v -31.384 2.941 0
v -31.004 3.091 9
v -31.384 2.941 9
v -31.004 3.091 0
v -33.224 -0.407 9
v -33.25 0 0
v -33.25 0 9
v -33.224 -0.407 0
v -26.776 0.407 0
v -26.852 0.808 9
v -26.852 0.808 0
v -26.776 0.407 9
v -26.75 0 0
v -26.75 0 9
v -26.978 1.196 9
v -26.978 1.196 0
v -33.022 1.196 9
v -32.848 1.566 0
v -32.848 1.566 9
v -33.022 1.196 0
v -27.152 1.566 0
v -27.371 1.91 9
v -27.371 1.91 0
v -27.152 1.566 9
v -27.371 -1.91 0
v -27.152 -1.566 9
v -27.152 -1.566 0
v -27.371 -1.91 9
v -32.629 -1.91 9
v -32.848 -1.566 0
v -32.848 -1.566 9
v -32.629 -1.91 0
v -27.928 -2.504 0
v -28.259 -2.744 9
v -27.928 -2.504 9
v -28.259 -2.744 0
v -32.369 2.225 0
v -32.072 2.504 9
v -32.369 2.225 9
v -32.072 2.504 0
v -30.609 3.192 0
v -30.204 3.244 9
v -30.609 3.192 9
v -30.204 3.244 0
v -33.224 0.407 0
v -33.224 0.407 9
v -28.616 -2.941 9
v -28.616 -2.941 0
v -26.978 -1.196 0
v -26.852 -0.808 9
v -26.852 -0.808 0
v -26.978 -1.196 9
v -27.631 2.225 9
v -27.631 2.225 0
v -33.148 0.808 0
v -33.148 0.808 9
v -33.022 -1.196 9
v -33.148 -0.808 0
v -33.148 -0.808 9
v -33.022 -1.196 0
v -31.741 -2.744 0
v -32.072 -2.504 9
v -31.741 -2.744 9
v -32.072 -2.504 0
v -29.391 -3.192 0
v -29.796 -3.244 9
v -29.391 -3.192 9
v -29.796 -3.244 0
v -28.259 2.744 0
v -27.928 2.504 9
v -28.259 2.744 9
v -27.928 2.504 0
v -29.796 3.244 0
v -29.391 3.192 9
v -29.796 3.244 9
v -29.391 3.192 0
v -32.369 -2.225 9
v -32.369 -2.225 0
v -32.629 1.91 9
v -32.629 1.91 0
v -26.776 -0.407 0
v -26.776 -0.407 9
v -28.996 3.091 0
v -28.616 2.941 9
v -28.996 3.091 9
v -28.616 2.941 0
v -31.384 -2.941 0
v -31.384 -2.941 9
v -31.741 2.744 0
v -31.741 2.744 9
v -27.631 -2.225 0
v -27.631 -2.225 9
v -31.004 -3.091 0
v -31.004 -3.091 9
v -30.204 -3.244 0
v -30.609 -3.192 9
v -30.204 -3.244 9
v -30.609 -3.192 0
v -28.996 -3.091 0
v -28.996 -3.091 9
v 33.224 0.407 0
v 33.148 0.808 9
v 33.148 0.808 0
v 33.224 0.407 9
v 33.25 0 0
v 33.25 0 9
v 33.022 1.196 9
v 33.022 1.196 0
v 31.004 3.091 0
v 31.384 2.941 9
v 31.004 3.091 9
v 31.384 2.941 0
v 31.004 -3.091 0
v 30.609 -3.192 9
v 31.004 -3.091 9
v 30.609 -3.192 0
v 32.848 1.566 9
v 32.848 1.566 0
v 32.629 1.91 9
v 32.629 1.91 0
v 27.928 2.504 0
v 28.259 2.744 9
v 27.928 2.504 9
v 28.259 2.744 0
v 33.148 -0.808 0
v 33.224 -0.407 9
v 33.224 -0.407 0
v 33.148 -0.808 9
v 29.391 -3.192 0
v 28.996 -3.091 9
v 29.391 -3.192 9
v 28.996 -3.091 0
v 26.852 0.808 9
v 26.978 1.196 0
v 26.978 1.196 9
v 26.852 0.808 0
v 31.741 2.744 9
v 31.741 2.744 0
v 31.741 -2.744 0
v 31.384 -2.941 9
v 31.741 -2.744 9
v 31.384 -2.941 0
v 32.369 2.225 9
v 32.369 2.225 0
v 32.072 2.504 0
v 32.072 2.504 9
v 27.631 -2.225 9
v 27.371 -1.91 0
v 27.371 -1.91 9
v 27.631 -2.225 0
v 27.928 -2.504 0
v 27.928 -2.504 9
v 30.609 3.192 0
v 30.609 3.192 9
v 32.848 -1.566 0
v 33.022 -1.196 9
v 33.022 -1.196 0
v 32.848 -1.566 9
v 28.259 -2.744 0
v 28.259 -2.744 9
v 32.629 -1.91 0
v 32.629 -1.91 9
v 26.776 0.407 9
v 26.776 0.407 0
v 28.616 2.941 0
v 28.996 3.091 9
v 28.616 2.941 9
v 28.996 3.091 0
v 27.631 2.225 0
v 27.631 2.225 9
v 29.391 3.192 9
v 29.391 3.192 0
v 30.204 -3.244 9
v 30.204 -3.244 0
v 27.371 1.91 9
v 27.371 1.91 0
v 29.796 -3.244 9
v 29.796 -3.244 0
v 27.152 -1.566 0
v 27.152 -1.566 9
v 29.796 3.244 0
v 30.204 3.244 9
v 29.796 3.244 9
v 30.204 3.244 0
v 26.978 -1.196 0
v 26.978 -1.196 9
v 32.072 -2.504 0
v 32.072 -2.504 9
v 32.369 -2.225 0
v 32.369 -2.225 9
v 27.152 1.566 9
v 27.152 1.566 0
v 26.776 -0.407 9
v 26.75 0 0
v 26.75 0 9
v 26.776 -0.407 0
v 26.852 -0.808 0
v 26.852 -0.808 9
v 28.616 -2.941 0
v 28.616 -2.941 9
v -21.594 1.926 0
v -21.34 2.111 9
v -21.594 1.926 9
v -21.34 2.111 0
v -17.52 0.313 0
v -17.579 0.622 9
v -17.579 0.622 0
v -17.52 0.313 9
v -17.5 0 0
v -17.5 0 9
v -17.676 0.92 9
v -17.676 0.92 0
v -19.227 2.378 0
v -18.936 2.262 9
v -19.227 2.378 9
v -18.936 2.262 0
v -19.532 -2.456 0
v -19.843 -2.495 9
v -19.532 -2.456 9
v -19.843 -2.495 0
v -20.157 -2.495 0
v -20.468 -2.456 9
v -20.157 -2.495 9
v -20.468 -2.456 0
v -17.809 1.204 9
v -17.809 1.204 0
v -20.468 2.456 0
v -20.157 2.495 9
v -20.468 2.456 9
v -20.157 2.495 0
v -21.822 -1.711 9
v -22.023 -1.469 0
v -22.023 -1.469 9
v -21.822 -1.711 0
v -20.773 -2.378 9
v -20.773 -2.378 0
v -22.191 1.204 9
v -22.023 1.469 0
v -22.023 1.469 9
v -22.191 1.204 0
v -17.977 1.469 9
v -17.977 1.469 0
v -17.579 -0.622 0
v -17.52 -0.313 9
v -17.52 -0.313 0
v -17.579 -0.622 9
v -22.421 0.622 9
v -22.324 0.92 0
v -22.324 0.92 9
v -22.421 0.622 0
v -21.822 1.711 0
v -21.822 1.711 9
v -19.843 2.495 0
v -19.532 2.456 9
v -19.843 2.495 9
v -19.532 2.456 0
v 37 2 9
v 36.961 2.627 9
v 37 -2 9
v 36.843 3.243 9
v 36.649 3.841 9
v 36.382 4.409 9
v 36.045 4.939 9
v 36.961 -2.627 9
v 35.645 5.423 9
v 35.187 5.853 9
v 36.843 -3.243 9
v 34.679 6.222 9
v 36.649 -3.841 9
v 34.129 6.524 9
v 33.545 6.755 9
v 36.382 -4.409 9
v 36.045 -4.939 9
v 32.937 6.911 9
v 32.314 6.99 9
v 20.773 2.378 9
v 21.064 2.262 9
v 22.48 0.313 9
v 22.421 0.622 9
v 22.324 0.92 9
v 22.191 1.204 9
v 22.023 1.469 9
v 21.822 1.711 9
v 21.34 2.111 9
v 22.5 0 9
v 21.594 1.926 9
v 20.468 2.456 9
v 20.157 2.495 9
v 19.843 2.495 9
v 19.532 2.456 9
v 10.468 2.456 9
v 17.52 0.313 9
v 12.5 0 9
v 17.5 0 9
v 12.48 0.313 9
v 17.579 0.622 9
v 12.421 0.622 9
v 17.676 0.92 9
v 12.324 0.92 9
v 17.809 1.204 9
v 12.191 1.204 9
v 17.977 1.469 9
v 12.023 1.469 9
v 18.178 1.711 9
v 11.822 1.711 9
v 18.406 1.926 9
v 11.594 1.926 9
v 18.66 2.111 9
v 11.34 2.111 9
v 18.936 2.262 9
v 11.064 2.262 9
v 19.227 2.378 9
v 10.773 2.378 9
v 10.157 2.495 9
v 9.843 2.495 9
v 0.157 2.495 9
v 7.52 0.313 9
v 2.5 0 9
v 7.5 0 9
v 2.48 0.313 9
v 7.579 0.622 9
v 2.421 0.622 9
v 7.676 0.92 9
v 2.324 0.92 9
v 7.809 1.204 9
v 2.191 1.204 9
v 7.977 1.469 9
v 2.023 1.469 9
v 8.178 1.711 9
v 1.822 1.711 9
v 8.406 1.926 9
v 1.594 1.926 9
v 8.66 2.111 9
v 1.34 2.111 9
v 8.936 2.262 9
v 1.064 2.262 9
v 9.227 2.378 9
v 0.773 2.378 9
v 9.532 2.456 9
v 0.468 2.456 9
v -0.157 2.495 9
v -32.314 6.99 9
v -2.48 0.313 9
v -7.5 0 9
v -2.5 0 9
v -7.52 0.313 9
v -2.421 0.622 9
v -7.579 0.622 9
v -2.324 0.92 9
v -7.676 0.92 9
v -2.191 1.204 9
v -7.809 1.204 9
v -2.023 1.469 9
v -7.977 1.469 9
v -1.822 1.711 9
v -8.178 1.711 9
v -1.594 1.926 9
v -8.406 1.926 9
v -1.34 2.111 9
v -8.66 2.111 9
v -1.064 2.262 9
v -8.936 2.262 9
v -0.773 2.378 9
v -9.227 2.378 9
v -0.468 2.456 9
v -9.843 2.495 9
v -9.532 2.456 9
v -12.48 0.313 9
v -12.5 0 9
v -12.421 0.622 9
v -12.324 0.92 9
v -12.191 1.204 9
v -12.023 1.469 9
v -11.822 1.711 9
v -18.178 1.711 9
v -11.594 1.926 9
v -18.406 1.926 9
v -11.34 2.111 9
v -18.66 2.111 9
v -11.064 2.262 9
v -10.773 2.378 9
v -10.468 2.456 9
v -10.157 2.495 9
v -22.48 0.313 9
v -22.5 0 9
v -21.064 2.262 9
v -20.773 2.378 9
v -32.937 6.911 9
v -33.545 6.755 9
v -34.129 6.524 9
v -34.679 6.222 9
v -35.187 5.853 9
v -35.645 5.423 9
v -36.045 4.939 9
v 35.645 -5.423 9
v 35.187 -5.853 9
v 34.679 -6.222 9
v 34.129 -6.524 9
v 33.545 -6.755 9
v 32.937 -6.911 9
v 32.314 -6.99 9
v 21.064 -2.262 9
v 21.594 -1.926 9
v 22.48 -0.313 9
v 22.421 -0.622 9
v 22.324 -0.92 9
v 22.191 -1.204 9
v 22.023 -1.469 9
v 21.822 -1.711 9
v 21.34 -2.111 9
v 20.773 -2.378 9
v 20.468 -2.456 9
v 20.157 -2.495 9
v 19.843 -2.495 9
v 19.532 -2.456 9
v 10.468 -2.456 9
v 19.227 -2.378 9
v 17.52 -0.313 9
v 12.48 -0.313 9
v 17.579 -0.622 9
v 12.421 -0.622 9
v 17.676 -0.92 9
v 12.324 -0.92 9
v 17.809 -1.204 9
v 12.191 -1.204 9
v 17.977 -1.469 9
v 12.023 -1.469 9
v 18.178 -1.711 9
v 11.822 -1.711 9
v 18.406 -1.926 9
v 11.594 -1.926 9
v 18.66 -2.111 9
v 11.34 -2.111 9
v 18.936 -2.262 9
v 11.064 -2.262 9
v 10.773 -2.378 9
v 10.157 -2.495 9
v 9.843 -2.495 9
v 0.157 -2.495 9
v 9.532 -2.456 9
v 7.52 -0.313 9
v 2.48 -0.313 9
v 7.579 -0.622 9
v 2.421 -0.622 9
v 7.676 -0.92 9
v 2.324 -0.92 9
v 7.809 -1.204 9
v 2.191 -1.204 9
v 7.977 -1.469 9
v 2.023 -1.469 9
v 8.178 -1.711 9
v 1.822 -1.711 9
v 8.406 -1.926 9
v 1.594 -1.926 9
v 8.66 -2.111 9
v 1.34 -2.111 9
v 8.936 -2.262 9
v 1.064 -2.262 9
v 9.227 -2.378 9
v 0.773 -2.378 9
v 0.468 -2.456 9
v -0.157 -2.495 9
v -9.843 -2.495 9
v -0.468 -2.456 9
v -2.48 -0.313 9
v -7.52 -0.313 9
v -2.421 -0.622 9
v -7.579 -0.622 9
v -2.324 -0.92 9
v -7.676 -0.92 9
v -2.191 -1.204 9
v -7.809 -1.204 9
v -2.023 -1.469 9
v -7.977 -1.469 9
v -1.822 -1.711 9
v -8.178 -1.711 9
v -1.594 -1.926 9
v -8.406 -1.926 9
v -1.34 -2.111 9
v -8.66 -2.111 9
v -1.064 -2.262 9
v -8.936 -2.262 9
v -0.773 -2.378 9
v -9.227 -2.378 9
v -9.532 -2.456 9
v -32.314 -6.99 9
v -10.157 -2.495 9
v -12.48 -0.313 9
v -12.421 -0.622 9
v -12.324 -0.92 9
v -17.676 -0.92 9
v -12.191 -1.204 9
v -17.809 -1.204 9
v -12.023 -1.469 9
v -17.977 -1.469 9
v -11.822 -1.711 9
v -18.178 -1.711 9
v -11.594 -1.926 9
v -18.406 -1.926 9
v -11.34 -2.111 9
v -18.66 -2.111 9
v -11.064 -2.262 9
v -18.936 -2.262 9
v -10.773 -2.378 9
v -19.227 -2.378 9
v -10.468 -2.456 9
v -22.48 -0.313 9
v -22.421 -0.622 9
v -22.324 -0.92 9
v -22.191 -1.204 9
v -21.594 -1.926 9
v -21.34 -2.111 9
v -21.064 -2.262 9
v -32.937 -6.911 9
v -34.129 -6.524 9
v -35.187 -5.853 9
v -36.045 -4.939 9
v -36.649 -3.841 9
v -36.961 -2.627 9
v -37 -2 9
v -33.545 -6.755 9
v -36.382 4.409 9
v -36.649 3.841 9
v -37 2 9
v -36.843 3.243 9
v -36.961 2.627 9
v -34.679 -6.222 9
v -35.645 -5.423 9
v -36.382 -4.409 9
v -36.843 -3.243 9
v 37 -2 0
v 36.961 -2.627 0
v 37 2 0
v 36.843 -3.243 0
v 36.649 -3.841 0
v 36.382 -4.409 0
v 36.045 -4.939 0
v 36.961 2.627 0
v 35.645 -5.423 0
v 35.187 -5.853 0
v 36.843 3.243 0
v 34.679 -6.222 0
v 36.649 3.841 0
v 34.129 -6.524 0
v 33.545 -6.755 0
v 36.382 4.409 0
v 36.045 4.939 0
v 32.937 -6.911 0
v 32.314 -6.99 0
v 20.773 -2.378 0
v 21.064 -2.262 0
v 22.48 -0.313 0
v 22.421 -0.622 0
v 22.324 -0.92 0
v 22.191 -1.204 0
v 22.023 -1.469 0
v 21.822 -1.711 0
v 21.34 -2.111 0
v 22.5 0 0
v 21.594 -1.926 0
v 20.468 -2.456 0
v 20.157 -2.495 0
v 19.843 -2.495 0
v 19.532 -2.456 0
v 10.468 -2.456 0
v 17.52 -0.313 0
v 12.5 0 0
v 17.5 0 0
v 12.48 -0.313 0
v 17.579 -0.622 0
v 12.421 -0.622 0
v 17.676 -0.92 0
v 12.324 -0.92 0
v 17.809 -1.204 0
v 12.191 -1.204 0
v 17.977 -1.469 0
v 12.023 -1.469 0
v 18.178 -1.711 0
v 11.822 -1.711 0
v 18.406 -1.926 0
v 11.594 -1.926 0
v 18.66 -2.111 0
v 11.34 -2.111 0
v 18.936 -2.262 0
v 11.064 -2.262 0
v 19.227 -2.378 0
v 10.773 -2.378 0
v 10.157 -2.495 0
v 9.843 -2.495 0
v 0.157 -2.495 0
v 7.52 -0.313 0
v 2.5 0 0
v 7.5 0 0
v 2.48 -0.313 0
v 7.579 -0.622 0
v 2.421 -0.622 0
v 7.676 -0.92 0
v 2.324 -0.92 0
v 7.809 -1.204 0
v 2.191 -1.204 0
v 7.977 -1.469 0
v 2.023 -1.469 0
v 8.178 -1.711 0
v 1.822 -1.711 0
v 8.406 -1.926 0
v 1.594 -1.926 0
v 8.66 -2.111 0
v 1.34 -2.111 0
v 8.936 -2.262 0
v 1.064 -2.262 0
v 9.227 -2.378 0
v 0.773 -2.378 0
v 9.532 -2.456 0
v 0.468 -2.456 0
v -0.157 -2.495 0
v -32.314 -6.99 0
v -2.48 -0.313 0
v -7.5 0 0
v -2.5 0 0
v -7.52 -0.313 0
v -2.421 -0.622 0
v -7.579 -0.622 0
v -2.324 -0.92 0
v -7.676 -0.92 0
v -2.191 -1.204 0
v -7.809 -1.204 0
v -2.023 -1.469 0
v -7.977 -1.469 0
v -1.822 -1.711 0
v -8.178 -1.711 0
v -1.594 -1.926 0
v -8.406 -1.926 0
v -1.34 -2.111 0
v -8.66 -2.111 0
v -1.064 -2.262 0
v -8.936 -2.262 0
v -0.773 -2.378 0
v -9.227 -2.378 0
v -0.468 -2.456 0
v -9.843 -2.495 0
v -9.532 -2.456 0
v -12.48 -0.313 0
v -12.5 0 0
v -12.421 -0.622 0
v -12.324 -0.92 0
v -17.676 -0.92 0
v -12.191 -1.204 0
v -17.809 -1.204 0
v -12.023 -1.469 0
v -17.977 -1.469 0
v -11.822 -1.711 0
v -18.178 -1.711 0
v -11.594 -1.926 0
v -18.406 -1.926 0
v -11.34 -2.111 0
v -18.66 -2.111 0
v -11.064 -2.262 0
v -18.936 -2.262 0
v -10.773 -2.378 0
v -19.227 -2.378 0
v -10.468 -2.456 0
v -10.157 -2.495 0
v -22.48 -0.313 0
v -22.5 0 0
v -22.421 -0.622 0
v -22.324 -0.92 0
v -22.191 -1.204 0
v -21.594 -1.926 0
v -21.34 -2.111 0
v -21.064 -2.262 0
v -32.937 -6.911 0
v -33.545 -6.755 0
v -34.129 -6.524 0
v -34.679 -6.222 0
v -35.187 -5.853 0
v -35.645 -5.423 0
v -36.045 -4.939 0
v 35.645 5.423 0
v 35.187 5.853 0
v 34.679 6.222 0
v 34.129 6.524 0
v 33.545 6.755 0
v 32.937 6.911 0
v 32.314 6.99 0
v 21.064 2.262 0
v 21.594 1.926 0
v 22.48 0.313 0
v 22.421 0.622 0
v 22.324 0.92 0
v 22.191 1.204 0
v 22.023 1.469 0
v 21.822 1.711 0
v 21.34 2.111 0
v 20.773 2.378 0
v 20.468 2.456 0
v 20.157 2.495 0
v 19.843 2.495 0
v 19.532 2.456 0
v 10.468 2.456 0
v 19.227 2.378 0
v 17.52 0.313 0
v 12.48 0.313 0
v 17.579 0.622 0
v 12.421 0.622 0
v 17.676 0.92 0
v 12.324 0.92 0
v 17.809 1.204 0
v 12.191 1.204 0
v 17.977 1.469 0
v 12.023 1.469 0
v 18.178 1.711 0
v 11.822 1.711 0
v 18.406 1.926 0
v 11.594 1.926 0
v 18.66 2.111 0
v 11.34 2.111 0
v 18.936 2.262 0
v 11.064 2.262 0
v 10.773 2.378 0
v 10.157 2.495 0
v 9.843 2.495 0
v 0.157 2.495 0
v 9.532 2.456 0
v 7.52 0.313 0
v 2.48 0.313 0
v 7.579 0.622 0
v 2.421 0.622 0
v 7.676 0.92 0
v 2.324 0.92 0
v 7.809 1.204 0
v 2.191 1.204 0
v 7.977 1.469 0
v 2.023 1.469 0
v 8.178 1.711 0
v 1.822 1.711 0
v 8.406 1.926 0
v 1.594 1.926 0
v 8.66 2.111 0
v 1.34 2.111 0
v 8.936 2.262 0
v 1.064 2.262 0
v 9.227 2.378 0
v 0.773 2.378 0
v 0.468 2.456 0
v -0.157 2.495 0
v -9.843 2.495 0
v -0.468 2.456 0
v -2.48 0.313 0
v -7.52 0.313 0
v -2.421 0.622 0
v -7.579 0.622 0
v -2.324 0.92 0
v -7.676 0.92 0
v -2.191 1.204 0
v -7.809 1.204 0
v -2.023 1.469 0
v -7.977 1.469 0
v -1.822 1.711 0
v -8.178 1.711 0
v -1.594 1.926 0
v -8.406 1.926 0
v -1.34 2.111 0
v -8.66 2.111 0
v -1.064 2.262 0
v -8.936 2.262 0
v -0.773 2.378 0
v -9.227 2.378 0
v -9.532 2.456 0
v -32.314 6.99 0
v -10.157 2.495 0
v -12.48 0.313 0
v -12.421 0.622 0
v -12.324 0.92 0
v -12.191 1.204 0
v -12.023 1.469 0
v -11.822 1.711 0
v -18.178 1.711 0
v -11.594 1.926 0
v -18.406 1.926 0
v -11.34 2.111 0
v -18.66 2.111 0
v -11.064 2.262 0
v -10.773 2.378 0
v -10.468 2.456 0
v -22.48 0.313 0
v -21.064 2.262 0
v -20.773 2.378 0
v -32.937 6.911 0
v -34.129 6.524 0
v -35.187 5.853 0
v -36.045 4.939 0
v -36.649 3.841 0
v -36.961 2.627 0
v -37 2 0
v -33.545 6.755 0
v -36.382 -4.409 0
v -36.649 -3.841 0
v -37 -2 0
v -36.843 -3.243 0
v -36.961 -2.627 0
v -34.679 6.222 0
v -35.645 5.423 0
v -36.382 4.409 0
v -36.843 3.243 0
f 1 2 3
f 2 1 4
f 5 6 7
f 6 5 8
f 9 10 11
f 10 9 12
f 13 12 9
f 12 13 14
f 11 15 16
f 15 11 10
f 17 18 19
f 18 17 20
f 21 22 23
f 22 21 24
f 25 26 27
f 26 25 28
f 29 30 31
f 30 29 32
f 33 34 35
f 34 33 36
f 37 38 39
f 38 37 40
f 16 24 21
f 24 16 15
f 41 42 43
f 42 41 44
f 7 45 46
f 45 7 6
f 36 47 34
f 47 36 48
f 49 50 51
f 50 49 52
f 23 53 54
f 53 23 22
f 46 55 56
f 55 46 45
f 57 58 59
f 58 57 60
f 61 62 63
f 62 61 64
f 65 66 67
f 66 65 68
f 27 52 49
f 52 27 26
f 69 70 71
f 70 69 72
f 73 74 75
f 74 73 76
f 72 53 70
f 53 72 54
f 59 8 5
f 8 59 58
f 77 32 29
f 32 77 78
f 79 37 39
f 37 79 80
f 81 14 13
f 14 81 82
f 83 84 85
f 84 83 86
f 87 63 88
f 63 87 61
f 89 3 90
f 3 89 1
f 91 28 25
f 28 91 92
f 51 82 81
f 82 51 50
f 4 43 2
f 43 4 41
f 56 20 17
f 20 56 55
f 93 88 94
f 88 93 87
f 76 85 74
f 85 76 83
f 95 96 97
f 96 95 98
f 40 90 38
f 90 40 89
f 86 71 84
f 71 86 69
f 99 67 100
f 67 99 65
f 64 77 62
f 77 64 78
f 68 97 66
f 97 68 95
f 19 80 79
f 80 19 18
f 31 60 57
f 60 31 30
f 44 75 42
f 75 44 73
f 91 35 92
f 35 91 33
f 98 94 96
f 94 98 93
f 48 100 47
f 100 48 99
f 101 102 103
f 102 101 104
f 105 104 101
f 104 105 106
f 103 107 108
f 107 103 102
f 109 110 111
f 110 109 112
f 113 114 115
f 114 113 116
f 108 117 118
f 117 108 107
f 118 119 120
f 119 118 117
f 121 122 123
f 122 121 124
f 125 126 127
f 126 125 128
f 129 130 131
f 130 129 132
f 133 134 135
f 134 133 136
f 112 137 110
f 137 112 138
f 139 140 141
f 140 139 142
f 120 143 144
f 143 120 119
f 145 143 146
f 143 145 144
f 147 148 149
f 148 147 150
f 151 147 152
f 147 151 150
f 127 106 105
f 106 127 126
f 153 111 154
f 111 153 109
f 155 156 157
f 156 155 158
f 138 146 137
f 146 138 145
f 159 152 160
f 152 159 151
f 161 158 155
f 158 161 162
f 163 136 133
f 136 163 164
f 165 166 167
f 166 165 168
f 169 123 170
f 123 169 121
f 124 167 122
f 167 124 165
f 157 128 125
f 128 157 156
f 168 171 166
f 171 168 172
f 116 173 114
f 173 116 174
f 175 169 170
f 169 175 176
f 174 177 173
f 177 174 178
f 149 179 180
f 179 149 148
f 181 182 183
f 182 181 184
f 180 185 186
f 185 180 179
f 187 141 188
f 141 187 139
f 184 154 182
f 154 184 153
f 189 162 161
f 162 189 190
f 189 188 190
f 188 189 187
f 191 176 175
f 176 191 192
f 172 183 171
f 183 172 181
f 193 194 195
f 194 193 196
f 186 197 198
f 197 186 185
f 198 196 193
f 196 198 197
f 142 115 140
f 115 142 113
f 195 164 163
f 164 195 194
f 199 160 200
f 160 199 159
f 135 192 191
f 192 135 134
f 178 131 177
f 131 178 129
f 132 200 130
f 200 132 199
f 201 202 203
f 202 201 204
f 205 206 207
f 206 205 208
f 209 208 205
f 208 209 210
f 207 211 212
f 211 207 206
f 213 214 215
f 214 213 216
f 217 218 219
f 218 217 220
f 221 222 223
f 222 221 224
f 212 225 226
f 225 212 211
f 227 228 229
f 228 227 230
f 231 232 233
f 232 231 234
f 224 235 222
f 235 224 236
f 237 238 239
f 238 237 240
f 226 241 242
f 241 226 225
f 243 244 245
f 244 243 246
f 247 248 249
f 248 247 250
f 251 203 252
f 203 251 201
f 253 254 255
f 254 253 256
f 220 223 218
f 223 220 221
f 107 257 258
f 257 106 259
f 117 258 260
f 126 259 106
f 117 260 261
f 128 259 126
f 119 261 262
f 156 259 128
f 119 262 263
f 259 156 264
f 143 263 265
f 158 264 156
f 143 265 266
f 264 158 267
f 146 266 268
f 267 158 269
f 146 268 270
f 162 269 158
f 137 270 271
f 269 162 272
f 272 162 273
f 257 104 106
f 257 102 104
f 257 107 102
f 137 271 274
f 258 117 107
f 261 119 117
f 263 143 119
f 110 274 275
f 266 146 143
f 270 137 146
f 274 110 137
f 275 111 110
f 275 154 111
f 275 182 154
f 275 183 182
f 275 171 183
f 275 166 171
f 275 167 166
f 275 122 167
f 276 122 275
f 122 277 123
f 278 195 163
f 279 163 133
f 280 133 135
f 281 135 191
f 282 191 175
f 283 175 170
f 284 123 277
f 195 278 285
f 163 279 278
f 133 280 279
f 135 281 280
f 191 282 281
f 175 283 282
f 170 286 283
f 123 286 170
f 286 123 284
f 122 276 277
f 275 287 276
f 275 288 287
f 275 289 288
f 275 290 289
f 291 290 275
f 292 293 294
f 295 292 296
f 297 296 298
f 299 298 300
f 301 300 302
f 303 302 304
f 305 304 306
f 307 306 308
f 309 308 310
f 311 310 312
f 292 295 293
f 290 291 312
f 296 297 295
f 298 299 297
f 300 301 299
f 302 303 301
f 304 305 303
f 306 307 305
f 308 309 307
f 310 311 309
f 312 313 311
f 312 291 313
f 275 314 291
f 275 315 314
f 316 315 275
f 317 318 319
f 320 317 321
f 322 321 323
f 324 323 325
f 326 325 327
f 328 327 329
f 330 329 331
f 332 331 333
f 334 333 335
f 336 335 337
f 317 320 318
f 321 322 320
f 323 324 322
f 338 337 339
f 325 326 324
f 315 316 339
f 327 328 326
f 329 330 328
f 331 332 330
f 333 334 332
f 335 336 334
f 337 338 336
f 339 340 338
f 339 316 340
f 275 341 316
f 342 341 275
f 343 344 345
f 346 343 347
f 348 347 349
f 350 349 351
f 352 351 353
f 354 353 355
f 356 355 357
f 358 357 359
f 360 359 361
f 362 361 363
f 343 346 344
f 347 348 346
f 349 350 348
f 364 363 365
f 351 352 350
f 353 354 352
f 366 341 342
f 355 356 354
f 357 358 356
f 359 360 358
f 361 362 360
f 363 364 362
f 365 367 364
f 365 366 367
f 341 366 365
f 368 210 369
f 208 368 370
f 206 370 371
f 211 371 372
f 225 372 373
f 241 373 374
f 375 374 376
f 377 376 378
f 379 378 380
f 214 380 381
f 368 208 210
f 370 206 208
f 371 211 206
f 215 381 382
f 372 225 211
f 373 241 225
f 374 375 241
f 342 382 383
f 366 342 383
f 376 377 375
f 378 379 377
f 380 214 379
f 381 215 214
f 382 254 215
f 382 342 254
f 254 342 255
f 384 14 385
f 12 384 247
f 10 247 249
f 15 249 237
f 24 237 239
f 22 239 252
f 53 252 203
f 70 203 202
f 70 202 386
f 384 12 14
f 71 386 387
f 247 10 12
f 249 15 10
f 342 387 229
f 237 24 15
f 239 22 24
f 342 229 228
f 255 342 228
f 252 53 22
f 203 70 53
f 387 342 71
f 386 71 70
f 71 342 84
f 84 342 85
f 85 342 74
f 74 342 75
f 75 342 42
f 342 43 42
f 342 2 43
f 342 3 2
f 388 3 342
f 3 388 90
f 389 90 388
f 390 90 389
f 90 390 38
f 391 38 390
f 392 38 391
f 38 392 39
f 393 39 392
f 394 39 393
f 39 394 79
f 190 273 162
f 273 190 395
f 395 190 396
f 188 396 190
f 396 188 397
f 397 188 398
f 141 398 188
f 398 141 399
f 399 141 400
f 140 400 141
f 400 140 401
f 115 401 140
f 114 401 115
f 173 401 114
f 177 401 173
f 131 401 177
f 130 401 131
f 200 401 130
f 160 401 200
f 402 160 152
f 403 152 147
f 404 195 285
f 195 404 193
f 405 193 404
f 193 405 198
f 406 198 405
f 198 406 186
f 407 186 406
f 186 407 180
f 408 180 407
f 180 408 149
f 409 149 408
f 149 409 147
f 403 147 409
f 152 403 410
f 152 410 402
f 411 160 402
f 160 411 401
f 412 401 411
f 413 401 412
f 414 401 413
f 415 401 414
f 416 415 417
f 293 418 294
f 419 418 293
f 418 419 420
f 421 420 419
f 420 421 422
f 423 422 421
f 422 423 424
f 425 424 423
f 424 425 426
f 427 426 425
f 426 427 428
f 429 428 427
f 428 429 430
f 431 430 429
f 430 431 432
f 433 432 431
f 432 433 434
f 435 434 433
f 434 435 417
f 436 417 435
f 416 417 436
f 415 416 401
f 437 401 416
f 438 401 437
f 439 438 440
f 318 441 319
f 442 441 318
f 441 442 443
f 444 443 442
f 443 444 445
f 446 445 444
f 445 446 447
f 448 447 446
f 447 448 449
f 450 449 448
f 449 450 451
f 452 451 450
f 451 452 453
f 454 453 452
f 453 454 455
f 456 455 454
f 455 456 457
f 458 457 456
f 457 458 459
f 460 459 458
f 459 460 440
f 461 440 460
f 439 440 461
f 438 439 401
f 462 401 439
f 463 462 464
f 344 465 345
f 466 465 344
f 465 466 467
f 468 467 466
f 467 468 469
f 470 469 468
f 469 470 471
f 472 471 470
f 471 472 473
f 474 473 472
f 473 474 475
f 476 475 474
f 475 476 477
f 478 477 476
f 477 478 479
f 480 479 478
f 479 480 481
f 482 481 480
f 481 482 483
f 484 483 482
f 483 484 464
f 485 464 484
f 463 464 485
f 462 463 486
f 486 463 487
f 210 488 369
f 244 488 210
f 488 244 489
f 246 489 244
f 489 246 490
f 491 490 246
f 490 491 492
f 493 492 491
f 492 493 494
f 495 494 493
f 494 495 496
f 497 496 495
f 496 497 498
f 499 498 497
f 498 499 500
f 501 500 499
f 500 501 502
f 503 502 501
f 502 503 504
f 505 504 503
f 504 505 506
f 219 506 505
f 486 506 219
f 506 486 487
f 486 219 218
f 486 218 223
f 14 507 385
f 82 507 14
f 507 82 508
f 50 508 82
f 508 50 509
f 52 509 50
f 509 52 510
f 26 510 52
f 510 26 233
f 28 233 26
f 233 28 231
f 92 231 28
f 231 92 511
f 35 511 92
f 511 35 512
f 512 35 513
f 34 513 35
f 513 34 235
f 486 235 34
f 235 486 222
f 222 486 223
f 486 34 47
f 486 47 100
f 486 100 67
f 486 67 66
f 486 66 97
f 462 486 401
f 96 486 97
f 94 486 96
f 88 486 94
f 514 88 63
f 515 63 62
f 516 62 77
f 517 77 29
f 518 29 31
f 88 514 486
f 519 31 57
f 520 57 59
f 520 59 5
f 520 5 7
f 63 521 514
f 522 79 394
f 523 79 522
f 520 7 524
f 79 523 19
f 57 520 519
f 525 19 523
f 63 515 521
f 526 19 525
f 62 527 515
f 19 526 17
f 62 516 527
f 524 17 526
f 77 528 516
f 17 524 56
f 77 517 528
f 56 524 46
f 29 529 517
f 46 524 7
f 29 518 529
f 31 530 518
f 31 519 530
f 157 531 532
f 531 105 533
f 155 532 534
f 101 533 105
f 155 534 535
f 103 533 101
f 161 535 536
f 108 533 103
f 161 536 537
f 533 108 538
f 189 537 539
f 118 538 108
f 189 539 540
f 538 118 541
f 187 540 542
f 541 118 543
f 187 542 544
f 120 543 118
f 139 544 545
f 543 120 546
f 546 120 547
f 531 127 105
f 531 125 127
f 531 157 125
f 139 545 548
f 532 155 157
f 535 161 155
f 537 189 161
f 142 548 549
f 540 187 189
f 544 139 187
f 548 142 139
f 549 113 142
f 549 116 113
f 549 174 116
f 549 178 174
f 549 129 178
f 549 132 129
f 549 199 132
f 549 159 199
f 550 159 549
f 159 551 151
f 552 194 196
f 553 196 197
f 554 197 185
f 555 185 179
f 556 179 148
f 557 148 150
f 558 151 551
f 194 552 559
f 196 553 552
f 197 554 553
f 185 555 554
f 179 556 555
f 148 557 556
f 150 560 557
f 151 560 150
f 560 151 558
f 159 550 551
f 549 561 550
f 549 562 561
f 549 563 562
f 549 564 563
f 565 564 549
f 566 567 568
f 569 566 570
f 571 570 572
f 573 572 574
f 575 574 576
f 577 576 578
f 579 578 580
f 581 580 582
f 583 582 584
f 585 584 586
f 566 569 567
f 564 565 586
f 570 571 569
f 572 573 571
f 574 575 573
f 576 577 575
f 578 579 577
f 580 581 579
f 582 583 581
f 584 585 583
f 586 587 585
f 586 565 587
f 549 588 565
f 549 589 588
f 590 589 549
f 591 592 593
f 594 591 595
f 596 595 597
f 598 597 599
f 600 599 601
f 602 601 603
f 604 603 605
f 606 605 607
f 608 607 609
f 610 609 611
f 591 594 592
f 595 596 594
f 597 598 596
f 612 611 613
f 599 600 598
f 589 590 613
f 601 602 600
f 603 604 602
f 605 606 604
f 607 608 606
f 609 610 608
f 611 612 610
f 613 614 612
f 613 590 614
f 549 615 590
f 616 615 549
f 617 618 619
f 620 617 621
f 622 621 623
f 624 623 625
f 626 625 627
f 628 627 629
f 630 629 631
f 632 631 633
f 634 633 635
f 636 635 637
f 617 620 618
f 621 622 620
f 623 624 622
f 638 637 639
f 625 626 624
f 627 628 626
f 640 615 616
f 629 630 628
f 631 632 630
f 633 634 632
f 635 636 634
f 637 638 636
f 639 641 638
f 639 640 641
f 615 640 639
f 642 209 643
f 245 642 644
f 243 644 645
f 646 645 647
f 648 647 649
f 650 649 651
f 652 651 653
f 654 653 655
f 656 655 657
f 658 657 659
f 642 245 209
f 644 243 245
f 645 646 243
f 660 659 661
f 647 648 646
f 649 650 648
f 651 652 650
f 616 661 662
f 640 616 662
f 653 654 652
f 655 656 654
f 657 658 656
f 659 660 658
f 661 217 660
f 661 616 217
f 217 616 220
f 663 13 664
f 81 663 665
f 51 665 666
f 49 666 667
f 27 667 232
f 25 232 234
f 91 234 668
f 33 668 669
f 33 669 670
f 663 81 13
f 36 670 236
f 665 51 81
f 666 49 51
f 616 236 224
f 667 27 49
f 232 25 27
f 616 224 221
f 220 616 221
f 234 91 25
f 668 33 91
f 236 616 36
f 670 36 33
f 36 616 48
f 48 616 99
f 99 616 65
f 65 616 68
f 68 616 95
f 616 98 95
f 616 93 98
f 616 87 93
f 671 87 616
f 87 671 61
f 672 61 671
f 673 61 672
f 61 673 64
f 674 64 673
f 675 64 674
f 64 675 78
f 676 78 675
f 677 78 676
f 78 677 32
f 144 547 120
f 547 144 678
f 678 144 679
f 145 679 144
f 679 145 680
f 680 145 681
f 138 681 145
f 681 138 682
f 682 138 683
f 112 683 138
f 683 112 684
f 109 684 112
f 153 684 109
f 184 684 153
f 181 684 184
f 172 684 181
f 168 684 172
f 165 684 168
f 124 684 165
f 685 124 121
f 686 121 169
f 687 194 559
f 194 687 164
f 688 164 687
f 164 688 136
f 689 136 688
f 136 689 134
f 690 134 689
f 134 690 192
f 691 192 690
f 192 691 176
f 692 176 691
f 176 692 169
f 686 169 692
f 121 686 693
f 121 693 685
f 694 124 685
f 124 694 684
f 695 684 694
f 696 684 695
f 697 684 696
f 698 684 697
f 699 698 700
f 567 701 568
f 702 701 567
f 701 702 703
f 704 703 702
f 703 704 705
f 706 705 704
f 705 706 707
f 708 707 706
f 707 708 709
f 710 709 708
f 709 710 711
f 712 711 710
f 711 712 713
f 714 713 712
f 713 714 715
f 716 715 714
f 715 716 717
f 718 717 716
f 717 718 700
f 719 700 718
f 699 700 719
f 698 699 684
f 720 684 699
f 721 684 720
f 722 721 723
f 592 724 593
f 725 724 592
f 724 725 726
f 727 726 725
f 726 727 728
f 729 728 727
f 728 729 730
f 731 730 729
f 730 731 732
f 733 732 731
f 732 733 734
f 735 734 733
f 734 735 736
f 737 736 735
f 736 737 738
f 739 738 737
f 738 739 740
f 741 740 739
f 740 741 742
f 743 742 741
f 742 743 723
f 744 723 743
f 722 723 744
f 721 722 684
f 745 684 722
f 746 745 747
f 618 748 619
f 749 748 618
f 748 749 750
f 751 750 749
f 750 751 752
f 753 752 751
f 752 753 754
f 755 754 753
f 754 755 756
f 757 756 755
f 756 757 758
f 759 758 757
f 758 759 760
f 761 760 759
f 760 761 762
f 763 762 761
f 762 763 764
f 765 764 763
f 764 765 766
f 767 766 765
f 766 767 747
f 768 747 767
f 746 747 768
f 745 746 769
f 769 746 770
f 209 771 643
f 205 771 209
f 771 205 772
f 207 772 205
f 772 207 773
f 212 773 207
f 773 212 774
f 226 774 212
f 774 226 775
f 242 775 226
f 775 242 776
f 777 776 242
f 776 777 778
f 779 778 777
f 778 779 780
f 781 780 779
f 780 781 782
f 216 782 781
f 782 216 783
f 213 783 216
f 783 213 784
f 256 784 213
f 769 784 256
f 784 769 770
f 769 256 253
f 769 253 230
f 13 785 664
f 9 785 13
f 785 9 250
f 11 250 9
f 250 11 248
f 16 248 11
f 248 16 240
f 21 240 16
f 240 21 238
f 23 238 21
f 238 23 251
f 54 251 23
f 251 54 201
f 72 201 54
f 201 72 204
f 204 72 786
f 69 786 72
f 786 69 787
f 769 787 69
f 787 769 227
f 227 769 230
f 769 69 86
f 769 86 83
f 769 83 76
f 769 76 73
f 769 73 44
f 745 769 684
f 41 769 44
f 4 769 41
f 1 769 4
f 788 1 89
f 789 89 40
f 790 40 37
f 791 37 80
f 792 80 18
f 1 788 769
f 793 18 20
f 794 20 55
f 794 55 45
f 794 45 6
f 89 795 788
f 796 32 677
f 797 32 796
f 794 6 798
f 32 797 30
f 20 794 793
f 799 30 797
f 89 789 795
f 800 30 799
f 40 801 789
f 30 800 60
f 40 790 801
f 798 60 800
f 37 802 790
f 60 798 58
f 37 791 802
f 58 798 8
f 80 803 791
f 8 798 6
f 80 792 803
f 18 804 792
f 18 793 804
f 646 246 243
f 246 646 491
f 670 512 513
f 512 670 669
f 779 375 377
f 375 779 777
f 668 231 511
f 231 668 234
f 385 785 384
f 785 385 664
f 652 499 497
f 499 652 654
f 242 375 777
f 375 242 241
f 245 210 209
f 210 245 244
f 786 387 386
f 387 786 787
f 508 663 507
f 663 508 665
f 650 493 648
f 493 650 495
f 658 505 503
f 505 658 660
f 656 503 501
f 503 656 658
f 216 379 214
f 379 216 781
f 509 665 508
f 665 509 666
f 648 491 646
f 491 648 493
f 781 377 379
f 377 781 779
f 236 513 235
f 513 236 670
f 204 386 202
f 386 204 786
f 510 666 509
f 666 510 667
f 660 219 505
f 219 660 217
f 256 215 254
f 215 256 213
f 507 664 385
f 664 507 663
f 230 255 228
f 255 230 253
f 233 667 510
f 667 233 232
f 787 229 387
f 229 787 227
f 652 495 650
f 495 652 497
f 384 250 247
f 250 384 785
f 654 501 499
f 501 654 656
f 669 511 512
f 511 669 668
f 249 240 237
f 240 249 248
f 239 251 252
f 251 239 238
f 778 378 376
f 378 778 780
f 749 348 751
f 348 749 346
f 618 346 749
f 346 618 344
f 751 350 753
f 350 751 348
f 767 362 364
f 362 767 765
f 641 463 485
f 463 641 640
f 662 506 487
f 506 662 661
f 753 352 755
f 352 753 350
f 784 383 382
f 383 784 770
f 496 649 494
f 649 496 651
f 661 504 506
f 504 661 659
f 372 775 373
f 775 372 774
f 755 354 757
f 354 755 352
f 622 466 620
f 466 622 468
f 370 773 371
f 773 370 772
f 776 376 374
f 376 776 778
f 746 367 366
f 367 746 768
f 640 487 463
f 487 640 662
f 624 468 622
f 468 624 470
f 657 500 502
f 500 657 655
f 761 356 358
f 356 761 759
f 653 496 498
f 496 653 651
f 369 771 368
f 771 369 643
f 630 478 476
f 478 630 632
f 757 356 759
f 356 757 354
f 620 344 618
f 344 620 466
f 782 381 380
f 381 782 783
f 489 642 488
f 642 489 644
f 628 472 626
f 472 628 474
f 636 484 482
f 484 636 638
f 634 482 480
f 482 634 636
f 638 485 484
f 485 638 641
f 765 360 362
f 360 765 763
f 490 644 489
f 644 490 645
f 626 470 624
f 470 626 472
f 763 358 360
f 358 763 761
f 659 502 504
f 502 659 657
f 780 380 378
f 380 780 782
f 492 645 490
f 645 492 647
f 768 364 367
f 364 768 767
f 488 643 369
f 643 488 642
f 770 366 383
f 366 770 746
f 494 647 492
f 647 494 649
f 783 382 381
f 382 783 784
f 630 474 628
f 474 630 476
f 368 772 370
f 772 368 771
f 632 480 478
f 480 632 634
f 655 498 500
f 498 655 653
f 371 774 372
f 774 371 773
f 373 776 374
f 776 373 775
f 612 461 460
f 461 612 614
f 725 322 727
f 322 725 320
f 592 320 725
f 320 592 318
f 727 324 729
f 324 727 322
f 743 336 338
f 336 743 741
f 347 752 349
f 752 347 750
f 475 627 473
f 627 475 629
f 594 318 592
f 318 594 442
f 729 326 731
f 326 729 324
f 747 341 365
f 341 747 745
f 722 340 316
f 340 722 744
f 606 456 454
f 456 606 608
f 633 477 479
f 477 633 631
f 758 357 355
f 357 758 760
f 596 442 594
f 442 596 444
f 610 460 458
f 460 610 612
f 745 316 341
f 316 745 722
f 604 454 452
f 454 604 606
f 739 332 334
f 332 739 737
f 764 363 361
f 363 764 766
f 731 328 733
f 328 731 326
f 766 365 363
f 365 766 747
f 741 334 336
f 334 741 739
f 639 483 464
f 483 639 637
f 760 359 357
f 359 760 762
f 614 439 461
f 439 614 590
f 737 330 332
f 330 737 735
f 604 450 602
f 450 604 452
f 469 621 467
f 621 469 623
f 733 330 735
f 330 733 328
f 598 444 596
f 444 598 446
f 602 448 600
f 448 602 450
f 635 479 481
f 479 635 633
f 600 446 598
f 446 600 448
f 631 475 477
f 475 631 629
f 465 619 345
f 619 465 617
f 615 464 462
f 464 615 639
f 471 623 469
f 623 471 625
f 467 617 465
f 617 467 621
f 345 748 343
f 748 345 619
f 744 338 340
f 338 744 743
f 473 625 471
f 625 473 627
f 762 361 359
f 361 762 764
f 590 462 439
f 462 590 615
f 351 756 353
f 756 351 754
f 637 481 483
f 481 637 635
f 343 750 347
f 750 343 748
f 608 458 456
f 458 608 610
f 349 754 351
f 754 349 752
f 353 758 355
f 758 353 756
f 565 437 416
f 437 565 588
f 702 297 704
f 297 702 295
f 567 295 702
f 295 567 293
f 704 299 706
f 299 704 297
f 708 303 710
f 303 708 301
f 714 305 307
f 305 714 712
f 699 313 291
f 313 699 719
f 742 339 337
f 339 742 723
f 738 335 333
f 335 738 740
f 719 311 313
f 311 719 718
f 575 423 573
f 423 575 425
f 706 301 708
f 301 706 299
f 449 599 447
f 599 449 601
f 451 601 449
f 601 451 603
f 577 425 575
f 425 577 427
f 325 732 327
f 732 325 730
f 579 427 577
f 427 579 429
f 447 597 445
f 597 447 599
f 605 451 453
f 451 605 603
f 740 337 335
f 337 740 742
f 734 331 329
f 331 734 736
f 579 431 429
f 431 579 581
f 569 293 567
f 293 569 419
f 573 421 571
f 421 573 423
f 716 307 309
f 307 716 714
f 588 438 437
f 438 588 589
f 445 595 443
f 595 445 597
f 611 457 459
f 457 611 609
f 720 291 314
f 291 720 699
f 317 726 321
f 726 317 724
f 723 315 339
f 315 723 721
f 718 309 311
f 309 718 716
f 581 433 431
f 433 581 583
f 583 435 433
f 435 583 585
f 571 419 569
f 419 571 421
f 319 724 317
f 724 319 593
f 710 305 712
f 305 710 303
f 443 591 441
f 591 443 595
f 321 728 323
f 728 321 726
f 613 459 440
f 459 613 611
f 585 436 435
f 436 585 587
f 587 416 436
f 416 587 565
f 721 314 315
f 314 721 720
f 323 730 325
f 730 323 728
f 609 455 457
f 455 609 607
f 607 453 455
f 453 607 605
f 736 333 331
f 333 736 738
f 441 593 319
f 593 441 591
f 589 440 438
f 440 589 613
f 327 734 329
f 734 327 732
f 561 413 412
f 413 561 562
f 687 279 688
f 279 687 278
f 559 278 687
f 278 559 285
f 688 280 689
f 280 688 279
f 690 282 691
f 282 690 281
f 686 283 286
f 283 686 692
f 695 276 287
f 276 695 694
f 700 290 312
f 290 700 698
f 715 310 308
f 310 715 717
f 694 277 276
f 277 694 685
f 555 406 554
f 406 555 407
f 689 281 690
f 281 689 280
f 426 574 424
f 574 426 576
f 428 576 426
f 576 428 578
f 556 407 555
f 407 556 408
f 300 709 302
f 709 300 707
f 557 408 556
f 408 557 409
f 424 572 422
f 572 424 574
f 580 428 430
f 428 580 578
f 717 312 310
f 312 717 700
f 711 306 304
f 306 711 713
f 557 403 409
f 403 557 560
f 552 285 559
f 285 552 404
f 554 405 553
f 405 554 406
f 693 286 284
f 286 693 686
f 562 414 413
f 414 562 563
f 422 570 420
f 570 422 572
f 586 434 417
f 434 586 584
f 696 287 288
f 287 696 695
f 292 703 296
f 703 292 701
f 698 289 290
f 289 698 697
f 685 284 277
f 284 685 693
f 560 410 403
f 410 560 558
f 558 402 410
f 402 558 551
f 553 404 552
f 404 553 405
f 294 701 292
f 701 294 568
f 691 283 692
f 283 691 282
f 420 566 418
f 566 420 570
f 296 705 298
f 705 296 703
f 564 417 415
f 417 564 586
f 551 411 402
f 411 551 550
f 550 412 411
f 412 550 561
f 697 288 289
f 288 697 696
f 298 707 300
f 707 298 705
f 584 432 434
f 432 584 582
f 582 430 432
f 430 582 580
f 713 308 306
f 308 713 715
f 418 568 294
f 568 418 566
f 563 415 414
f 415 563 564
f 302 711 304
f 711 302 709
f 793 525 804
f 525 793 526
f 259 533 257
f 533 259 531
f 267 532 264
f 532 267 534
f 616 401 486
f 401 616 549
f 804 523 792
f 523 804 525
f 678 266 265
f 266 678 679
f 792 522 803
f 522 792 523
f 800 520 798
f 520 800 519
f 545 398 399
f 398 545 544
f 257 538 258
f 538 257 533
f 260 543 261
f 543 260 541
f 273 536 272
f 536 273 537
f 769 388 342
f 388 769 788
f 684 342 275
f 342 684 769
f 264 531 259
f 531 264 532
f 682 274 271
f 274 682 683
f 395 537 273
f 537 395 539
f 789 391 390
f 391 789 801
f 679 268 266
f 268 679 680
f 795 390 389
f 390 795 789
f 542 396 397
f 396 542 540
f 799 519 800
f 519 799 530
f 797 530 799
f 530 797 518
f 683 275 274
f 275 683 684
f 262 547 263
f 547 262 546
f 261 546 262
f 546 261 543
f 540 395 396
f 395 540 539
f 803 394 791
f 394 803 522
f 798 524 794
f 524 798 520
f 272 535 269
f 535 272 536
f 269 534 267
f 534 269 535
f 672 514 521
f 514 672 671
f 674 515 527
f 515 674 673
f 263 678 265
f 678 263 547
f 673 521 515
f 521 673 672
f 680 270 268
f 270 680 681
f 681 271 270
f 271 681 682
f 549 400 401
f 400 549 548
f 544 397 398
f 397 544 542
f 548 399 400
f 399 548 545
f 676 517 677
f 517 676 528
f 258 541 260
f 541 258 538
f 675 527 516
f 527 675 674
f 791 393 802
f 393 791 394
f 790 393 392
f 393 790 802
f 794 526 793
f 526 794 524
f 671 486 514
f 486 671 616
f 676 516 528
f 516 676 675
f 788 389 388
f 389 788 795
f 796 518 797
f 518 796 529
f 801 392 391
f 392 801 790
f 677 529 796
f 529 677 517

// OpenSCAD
$fn = 50;


difference() {
	union() {
		hull() {
			translate(v = [-32.0000000000, 2.0000000000, 0]) {
				cylinder(h = 9, r = 5);
			}
			translate(v = [32.0000000000, 2.0000000000, 0]) {
				cylinder(h = 9, r = 5);
			}
			translate(v = [-32.0000000000, -2.0000000000, 0]) {
				cylinder(h = 9, r = 5);
			}
			translate(v = [32.0000000000, -2.0000000000, 0]) {
				cylinder(h = 9, r = 5);
			}
		}
	}
	union() {
		#translate(v = [-30.0000000000, 0.0000000000, 0]) {
			cylinder(h = 9, r = 3.2500000000);
		}
		#translate(v = [30.0000000000, 0.0000000000, 0]) {
			cylinder(h = 9, r = 3.2500000000);
		}
		#translate(v = [-30.0000000000, 0.0000000000, -100.0000000000]) {
			cylinder(h = 200, r = 3.2500000000);
		}
		#translate(v = [-30.0000000000, 0.0000000000, -100.0000000000]) {
			cylinder(h = 200, r = 3.2500000000);
		}
		#translate(v = [30.0000000000, 0.0000000000, -100.0000000000]) {
			cylinder(h = 200, r = 3.2500000000);
		}
		#translate(v = [30.0000000000, 0.0000000000, -100.0000000000]) {
			cylinder(h = 200, r = 3.2500000000);
		}
		#translate(v = [-30.0000000000, 0.0000000000, 0]) {
			cylinder(h = 9, r = 1.8000000000);
		}
		#translate(v = [30.0000000000, 0.0000000000, 0]) {
			cylinder(h = 9, r = 1.8000000000);
		}
		#translate(v = [-30.0000000000, 0.0000000000, 0]) {
			cylinder(h = 9, r = 1.8000000000);
		}
		#translate(v = [30.0000000000, 0.0000000000, 0]) {
			cylinder(h = 9, r = 1.8000000000);
		}
		#translate(v = [-30.0000000000, 0.0000000000, 0]) {
			cylinder(h = 9, r = 1.8000000000);
		}
		#translate(v = [30.0000000000, 0.0000000000, 0]) {
			cylinder(h = 9, r = 1.8000000000);
		}
		#translate(v = [-20.0000000000, 0, 0]) {
			cylinder(h = 9, r = 2.5000000000);
		}
		#translate(v = [-10.0000000000, 0, 0]) {
			cylinder(h = 9, r = 2.5000000000);
		}
		#cylinder(h = 9, r = 2.5000000000);
		#translate(v = [10.0000000000, 0, 0]) {
			cylinder(h = 9, r = 2.5000000000);
		}
		#translate(v = [20.0000000000, 0, 0]) {
			cylinder(h = 9, r = 2.5000000000);
		}
	}
}
